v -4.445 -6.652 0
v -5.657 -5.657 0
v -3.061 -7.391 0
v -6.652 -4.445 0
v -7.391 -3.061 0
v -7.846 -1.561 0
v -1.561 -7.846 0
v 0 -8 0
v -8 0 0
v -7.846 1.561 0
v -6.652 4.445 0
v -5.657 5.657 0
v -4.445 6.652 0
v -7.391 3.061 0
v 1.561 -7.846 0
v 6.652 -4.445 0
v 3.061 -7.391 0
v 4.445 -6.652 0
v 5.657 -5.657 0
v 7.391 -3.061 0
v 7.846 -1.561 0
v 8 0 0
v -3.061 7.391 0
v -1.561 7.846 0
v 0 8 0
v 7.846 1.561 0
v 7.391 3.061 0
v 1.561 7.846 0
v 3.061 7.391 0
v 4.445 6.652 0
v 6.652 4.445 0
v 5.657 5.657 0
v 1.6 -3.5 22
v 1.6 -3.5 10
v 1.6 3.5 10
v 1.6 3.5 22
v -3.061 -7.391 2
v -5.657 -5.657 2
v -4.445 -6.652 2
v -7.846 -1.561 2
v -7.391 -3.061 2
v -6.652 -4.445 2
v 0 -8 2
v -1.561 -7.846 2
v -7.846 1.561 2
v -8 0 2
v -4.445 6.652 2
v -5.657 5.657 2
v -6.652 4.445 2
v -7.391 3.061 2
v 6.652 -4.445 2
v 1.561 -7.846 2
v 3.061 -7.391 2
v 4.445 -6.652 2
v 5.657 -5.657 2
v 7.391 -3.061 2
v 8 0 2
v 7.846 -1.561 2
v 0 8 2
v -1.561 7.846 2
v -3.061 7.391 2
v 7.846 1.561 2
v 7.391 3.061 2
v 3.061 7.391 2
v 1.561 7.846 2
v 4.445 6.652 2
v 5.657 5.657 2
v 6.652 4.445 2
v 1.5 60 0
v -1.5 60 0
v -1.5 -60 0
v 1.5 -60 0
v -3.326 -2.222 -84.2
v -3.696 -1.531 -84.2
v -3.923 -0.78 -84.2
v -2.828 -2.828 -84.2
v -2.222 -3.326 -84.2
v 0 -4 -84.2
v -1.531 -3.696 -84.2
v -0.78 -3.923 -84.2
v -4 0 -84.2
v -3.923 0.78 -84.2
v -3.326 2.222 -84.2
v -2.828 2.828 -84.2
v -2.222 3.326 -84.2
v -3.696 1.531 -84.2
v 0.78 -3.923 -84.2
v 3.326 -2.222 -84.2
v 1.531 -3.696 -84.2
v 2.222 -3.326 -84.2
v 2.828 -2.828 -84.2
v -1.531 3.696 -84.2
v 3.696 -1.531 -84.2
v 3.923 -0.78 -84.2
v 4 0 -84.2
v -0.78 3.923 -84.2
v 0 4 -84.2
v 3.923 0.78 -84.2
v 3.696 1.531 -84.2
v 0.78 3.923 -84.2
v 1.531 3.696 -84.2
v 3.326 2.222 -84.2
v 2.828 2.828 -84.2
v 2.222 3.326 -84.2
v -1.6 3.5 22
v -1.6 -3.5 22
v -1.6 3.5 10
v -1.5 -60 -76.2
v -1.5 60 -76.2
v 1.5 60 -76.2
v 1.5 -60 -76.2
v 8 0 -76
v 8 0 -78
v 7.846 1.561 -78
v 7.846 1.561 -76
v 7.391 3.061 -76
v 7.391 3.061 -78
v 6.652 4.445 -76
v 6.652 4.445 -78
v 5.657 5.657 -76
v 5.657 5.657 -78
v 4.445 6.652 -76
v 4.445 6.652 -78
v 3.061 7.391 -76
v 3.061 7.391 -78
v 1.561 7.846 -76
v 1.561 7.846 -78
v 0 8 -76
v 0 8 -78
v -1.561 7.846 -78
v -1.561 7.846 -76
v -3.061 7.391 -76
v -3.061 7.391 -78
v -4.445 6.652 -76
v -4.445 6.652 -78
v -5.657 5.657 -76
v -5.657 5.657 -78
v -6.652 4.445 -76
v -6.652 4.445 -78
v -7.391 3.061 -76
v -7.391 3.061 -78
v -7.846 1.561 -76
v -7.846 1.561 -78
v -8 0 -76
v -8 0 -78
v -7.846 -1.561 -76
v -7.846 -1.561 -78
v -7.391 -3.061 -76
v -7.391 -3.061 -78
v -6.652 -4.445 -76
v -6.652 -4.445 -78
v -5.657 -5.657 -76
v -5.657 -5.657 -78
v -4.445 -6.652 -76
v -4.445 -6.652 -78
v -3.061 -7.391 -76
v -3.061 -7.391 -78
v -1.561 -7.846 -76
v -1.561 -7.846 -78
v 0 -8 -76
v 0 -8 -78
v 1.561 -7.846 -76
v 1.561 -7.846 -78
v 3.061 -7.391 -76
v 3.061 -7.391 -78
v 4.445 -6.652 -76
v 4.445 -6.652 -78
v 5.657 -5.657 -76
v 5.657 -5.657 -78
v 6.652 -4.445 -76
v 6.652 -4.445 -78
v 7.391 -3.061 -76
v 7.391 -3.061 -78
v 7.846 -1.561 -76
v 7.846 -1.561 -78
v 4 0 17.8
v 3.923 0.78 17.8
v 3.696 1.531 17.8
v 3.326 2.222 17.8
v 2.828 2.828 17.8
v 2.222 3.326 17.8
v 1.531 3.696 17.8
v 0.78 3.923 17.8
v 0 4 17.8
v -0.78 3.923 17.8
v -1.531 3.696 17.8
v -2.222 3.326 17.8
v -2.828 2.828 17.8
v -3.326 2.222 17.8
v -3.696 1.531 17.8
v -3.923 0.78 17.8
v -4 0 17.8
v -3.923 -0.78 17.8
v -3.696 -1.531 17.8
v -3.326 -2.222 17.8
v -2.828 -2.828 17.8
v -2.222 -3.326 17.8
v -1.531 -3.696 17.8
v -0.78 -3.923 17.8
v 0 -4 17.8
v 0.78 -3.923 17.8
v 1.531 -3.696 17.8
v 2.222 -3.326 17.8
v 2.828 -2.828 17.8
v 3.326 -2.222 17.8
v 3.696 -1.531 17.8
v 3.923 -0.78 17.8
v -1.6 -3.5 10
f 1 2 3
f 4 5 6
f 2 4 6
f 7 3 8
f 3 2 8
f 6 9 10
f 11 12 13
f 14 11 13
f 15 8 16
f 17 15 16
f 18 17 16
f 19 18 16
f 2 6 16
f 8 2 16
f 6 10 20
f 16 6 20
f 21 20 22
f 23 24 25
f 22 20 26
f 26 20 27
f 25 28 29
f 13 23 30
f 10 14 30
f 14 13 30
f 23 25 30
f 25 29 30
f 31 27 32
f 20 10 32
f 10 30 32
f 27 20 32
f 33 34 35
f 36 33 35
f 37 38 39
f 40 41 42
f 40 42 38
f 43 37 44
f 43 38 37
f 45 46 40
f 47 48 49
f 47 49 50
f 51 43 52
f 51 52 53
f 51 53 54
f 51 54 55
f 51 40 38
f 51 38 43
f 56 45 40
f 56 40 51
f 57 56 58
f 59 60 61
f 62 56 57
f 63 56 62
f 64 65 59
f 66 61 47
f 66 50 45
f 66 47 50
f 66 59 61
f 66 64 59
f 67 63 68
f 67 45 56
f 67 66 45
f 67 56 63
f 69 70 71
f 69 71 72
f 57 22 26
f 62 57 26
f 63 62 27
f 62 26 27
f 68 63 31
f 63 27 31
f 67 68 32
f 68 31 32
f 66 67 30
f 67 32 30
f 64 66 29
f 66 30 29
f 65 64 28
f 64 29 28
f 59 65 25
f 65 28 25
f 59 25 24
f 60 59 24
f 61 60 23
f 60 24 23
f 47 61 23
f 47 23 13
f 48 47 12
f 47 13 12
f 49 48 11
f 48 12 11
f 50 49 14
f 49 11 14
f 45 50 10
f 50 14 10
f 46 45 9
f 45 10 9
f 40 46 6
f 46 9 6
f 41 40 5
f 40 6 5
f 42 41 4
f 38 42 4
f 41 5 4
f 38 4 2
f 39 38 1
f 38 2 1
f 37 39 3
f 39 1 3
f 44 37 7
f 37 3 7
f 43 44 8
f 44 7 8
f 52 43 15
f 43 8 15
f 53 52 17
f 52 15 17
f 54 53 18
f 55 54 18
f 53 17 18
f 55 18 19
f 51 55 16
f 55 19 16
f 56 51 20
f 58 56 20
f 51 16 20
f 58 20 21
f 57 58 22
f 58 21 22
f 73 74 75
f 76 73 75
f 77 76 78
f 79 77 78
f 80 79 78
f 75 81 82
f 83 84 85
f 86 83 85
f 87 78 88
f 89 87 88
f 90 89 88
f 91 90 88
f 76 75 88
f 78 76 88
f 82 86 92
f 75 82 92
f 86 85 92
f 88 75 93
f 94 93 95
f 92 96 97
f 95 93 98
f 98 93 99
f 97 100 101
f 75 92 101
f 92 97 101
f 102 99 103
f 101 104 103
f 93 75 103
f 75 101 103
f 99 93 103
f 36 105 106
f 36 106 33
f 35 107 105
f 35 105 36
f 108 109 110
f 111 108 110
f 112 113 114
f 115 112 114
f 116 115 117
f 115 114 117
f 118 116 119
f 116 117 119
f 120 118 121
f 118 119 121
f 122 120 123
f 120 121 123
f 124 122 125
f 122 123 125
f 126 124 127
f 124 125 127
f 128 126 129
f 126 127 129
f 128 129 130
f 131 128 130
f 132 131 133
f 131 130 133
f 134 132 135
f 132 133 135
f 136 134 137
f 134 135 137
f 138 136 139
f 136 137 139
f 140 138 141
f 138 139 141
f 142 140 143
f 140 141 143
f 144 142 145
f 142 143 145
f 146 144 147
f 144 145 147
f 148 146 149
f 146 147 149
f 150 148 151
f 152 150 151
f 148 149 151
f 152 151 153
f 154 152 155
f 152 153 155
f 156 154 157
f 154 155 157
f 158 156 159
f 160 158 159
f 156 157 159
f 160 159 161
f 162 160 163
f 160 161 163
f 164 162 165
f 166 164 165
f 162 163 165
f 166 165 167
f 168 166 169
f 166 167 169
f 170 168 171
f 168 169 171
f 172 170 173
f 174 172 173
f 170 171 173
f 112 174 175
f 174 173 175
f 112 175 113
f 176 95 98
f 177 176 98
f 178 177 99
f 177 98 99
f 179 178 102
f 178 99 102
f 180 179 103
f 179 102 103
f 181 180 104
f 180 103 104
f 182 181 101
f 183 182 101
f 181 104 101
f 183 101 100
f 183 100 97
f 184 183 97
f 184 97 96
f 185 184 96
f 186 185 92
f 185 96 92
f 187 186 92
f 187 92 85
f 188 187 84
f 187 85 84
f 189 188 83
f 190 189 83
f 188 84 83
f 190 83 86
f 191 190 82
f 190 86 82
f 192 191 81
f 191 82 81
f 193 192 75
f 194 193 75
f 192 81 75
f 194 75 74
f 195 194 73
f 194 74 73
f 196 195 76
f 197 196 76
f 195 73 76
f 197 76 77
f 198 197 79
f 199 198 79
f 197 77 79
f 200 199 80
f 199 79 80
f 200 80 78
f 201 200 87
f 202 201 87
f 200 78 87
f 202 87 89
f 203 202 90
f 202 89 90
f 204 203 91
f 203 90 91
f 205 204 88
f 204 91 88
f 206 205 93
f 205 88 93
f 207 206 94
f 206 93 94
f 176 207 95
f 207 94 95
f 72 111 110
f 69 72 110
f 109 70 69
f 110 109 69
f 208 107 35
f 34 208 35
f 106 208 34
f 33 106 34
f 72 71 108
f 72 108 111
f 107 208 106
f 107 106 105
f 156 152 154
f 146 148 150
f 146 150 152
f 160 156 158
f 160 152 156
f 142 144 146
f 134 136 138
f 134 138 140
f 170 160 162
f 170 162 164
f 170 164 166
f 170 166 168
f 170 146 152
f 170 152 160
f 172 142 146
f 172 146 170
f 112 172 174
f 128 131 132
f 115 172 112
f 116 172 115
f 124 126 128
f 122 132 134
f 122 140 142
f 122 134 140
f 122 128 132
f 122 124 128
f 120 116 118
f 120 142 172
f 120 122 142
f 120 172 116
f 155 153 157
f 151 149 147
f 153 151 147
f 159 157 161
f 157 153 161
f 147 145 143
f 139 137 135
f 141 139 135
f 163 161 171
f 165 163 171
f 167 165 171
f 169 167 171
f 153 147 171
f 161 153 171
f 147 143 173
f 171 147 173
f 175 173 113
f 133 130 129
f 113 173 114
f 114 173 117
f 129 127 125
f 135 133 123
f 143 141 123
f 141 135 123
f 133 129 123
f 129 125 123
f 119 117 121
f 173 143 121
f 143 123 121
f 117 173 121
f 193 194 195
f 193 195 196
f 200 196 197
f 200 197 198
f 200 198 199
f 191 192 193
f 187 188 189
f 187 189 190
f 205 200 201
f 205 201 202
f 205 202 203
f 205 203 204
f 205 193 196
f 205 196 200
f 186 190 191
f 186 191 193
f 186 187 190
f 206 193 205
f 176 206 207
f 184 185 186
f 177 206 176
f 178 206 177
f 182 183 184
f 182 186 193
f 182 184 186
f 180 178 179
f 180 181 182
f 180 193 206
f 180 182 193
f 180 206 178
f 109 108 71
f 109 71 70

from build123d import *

# Parameters (mm, degrees)
CYLINDER_R        = 4
CYLINDER_DEPTH    = 102
BOX_W             = 3.2
BOX_H             = 7
BOX_DEPTH         = 12
BOX001_W          = 3
BOX001_H          = 120
BOX001_DEPTH      = 76.2
CYLINDER001_R     = 8
CYLINDER001_DEPTH = 2
CYLINDER002_R     = 8
CYLINDER002_DEPTH = 2


with BuildPart() as cylinder:
    # Cylinder → Cylinder (new body)
    with BuildSketch(Plane.XY.offset(-84.2)):
        Circle(CYLINDER_R)
    extrude(amount=CYLINDER_DEPTH)


with BuildPart() as cube:
    # Box → Box (new body)
    with BuildSketch(Plane(origin=(-1.6, -3.5, 10), x_dir=(1, 0, 0), z_dir=(0, 0, 1))):
        with Locations((1.6, 3.5)):
            Rectangle(BOX_W, BOX_H)
    extrude(amount=BOX_DEPTH)


with BuildPart() as cube001:
    # Box001 → Box001 (new body)
    with BuildSketch(Plane(origin=(-1.5, -60, -76.2), x_dir=(1, 0, 0), z_dir=(0, 0, 1))):
        with Locations((1.5, 60)):
            Rectangle(BOX001_W, BOX001_H)
    extrude(amount=BOX001_DEPTH)


with BuildPart() as cylinder001:
    # Cylinder001 → Cylinder001 (new body)
    with BuildSketch(Plane.XY):
        Circle(CYLINDER001_R)
    extrude(amount=CYLINDER001_DEPTH)


with BuildPart() as cylinder002:
    # Cylinder002 → Cylinder002 (new body)
    with BuildSketch(Plane.XY.offset(-78)):
        Circle(CYLINDER002_R)
    extrude(amount=CYLINDER002_DEPTH)


solid = Compound([cylinder.part, cube.part, cube001.part, cylinder001.part, cylinder002.part])
